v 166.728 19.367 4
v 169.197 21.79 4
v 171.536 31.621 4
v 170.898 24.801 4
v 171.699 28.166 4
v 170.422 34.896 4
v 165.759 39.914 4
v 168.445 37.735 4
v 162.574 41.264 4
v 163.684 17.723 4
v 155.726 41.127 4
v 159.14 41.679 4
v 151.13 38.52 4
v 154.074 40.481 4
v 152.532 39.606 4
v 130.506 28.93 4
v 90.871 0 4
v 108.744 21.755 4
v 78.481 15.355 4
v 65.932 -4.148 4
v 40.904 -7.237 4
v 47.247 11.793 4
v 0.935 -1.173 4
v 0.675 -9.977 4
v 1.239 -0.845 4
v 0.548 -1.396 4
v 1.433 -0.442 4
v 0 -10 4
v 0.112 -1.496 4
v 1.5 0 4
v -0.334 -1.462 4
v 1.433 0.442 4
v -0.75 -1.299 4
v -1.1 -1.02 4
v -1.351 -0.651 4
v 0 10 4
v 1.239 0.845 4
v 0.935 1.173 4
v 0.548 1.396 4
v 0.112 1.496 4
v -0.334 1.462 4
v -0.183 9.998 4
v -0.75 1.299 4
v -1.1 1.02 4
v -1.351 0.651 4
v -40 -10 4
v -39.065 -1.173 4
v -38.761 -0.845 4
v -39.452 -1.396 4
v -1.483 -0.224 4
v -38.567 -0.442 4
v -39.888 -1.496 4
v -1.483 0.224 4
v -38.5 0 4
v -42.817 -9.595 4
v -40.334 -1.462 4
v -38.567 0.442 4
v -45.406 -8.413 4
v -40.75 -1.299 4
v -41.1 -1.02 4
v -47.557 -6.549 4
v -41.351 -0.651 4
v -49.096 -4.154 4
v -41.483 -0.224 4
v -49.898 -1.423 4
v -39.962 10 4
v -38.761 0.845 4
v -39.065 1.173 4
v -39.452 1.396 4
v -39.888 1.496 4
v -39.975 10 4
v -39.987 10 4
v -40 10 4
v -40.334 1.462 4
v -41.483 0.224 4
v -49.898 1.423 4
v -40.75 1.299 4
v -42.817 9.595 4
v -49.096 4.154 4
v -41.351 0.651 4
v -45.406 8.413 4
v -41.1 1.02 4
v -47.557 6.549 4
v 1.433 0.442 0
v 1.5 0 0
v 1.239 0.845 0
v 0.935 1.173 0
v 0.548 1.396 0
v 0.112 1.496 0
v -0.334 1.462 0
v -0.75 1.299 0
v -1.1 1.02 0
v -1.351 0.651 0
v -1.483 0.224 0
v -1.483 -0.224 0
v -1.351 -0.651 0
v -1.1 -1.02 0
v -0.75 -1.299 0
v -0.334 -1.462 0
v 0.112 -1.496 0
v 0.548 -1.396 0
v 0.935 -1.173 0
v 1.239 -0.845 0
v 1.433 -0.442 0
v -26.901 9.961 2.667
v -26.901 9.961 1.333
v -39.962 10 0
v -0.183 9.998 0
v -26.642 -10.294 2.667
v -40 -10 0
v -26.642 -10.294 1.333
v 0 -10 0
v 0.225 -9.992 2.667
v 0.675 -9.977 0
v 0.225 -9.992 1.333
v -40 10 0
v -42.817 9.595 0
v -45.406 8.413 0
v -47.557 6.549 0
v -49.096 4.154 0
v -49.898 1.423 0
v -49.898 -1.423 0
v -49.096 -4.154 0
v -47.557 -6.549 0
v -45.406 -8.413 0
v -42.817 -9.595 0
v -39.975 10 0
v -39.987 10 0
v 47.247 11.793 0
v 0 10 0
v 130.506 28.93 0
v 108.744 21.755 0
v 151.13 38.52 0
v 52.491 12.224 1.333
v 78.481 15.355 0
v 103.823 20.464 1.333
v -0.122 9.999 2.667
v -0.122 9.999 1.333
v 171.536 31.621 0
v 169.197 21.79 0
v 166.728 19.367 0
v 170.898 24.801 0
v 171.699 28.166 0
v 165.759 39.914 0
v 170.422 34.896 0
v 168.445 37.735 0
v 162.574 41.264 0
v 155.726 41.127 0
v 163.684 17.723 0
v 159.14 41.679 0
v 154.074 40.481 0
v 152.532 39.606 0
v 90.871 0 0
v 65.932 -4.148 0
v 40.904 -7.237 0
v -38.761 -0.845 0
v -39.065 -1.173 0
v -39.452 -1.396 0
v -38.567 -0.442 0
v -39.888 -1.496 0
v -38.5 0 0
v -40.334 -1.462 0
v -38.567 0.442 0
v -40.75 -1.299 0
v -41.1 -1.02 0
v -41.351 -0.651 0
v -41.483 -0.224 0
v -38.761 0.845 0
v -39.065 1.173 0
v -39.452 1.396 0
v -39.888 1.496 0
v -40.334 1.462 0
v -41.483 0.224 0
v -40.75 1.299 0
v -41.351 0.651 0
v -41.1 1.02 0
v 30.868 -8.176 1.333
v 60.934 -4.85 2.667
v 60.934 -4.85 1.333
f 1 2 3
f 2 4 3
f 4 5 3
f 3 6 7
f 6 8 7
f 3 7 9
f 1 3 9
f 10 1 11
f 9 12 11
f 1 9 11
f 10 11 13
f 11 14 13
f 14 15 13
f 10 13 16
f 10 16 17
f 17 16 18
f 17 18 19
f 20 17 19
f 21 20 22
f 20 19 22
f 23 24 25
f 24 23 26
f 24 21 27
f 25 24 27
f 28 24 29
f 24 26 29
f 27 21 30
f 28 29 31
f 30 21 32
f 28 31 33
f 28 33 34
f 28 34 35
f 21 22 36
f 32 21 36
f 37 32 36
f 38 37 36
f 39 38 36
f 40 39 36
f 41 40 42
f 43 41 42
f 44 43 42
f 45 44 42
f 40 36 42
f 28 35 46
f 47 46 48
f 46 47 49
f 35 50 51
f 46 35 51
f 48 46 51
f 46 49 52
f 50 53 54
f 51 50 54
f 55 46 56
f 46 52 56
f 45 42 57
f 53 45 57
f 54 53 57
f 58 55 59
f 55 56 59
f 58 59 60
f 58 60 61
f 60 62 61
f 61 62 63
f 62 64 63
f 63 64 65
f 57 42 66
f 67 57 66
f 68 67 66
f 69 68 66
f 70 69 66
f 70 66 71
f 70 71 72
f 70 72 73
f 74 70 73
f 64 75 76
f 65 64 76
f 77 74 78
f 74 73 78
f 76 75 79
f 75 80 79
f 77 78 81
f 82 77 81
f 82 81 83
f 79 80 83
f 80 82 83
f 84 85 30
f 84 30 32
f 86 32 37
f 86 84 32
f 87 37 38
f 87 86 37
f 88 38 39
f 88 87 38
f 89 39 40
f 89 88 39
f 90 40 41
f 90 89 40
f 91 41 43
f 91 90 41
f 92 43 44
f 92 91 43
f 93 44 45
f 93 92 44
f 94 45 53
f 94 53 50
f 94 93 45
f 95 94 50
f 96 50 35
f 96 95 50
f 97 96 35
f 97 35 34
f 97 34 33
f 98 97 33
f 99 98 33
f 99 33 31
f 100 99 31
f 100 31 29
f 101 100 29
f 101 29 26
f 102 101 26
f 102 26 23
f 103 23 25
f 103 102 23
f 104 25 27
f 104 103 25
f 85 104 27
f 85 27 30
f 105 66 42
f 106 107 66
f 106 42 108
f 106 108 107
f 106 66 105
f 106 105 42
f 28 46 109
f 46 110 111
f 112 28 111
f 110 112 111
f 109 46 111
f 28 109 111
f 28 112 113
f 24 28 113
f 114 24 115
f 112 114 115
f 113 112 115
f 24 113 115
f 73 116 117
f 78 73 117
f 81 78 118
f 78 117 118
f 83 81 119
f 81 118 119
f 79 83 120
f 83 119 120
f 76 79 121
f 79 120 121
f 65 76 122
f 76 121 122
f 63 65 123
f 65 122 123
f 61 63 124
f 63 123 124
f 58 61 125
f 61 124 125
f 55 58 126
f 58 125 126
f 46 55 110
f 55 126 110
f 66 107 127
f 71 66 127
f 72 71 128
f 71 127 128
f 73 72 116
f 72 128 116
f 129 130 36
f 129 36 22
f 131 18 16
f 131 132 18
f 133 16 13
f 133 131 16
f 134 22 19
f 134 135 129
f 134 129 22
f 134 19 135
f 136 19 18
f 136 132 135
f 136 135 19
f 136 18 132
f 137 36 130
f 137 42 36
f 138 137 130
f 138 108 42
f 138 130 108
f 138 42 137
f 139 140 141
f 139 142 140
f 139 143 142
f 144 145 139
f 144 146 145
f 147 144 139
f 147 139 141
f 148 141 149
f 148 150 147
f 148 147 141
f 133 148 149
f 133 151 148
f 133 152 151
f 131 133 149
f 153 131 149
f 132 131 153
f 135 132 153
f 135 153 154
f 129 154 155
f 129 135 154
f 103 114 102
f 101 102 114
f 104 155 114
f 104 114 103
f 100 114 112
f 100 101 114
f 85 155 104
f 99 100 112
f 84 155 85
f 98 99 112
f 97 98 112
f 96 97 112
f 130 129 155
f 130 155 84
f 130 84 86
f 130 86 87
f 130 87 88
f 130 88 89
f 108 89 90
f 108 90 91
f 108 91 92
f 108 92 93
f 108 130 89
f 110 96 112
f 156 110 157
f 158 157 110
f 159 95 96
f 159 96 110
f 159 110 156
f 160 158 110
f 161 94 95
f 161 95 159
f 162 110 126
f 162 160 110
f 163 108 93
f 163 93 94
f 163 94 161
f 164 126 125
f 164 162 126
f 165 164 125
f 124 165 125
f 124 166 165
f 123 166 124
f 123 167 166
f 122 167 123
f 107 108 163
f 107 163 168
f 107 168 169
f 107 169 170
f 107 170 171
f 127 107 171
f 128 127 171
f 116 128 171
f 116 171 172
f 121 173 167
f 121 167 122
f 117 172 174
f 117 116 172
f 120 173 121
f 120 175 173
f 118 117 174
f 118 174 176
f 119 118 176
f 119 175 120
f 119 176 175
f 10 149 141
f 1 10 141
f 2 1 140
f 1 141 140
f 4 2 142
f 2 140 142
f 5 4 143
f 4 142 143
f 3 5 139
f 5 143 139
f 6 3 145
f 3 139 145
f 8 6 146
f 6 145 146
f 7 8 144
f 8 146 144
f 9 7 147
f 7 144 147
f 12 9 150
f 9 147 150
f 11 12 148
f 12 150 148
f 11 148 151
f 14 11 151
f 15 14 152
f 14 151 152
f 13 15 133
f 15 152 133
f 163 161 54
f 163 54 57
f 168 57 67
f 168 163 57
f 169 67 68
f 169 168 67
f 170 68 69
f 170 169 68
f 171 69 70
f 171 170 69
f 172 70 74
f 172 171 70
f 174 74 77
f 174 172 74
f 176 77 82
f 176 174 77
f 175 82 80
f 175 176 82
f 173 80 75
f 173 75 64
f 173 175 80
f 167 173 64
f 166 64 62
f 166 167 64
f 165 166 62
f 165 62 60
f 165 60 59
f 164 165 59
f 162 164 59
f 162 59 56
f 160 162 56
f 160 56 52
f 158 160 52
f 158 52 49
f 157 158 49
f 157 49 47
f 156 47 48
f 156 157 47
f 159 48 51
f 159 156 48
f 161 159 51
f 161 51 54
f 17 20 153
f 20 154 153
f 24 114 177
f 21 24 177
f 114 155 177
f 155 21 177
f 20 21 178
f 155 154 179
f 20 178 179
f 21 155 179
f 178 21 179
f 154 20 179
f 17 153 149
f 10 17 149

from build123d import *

# Parameters (mm, degrees)
SKETCH_1_R      = 1.5
EXTRUDE_1_DEPTH = 4


with BuildPart() as part:
    # 草图1 → 凸台-拉伸1 (new body)
    with BuildSketch(Plane.XY):
        with BuildLine():
            add(Edge.make_bspline(
                [(0, 10), (52.11400991, 10.48088872), (106.792215868, 14.291406746), (151.130268959, 38.519700222)],
                knots=[0.172138622, 0.172138622, 0.172138622, 0.172138622, 0.832549304, 0.832549304, 0.832549304, 0.832549304], degree=3))
            add(Edge.make_bspline(
                [(-0.183054557, 9.998324411), (-0.122039901, 9.998878394), (-0.061021708, 9.999436914), (0, 10)],
                knots=[0.17136533, 0.17136533, 0.17136533, 0.17136533, 0.172138622, 0.172138622, 0.172138622, 0.172138622], degree=3))
            add(Edge.make_bspline(
                [(-39.962254298, 9.999928763), (-27.025718651, 9.975441168), (-13.691052102, 9.875678503), (-0.183054557, 9.998324411)],
                knots=[0.000166511, 0.000166511, 0.000166511, 0.000166511, 0.17136533, 0.17136533, 0.17136533, 0.17136533], degree=3))
            ThreePointArc((-39.962254298, 9.999928763), (-39.981127115, 9.999982191), (-40, 10))
            ThreePointArc((-40, 10), (-50, 0), (-40, -10))
            add(Edge.make_bspline(
                [(-40, -10), (-26.629572895, -10.441521612), (-13.296239562, -10.441521612), (0, -10)],
                knots=[0, 0, 0, 0, 0.198467229, 0.198467229, 0.198467229, 0.198467229], degree=3))
            add(Edge.make_bspline(
                [(0, -10), (0.224885721, -9.992532332), (0.449760832, -9.984938359), (0.674625331, -9.977218082)],
                knots=[0.198467229, 0.198467229, 0.198467229, 0.198467229, 0.201824001, 0.201824001, 0.201824001, 0.201824001], degree=3))
            add(Edge.make_bspline(
                [(0.674625331, -9.977218082), (30.932305536, -8.938380612), (60.997855132, -5.612641251), (90.871274119, 0)],
                knots=[0.201824001, 0.201824001, 0.201824001, 0.201824001, 0.653509958, 0.653509958, 0.653509958, 0.653509958], degree=3))
            Line((90.871274119, 0), (163.684000861, 17.723388911))
            ThreePointArc((163.684000861, 17.723388911), (171.094194245, 33.297976406), (155.725788693, 41.126823857))
            ThreePointArc((155.725788693, 41.126823857), (153.287141392, 40.071601234), (151.130268959, 38.519700222))
        make_face()
        with Locations((-40, 0)):
            Circle(SKETCH_1_R, mode=Mode.SUBTRACT)
        Circle(SKETCH_1_R, mode=Mode.SUBTRACT)
    extrude(amount=EXTRUDE_1_DEPTH)


solid = part.part
